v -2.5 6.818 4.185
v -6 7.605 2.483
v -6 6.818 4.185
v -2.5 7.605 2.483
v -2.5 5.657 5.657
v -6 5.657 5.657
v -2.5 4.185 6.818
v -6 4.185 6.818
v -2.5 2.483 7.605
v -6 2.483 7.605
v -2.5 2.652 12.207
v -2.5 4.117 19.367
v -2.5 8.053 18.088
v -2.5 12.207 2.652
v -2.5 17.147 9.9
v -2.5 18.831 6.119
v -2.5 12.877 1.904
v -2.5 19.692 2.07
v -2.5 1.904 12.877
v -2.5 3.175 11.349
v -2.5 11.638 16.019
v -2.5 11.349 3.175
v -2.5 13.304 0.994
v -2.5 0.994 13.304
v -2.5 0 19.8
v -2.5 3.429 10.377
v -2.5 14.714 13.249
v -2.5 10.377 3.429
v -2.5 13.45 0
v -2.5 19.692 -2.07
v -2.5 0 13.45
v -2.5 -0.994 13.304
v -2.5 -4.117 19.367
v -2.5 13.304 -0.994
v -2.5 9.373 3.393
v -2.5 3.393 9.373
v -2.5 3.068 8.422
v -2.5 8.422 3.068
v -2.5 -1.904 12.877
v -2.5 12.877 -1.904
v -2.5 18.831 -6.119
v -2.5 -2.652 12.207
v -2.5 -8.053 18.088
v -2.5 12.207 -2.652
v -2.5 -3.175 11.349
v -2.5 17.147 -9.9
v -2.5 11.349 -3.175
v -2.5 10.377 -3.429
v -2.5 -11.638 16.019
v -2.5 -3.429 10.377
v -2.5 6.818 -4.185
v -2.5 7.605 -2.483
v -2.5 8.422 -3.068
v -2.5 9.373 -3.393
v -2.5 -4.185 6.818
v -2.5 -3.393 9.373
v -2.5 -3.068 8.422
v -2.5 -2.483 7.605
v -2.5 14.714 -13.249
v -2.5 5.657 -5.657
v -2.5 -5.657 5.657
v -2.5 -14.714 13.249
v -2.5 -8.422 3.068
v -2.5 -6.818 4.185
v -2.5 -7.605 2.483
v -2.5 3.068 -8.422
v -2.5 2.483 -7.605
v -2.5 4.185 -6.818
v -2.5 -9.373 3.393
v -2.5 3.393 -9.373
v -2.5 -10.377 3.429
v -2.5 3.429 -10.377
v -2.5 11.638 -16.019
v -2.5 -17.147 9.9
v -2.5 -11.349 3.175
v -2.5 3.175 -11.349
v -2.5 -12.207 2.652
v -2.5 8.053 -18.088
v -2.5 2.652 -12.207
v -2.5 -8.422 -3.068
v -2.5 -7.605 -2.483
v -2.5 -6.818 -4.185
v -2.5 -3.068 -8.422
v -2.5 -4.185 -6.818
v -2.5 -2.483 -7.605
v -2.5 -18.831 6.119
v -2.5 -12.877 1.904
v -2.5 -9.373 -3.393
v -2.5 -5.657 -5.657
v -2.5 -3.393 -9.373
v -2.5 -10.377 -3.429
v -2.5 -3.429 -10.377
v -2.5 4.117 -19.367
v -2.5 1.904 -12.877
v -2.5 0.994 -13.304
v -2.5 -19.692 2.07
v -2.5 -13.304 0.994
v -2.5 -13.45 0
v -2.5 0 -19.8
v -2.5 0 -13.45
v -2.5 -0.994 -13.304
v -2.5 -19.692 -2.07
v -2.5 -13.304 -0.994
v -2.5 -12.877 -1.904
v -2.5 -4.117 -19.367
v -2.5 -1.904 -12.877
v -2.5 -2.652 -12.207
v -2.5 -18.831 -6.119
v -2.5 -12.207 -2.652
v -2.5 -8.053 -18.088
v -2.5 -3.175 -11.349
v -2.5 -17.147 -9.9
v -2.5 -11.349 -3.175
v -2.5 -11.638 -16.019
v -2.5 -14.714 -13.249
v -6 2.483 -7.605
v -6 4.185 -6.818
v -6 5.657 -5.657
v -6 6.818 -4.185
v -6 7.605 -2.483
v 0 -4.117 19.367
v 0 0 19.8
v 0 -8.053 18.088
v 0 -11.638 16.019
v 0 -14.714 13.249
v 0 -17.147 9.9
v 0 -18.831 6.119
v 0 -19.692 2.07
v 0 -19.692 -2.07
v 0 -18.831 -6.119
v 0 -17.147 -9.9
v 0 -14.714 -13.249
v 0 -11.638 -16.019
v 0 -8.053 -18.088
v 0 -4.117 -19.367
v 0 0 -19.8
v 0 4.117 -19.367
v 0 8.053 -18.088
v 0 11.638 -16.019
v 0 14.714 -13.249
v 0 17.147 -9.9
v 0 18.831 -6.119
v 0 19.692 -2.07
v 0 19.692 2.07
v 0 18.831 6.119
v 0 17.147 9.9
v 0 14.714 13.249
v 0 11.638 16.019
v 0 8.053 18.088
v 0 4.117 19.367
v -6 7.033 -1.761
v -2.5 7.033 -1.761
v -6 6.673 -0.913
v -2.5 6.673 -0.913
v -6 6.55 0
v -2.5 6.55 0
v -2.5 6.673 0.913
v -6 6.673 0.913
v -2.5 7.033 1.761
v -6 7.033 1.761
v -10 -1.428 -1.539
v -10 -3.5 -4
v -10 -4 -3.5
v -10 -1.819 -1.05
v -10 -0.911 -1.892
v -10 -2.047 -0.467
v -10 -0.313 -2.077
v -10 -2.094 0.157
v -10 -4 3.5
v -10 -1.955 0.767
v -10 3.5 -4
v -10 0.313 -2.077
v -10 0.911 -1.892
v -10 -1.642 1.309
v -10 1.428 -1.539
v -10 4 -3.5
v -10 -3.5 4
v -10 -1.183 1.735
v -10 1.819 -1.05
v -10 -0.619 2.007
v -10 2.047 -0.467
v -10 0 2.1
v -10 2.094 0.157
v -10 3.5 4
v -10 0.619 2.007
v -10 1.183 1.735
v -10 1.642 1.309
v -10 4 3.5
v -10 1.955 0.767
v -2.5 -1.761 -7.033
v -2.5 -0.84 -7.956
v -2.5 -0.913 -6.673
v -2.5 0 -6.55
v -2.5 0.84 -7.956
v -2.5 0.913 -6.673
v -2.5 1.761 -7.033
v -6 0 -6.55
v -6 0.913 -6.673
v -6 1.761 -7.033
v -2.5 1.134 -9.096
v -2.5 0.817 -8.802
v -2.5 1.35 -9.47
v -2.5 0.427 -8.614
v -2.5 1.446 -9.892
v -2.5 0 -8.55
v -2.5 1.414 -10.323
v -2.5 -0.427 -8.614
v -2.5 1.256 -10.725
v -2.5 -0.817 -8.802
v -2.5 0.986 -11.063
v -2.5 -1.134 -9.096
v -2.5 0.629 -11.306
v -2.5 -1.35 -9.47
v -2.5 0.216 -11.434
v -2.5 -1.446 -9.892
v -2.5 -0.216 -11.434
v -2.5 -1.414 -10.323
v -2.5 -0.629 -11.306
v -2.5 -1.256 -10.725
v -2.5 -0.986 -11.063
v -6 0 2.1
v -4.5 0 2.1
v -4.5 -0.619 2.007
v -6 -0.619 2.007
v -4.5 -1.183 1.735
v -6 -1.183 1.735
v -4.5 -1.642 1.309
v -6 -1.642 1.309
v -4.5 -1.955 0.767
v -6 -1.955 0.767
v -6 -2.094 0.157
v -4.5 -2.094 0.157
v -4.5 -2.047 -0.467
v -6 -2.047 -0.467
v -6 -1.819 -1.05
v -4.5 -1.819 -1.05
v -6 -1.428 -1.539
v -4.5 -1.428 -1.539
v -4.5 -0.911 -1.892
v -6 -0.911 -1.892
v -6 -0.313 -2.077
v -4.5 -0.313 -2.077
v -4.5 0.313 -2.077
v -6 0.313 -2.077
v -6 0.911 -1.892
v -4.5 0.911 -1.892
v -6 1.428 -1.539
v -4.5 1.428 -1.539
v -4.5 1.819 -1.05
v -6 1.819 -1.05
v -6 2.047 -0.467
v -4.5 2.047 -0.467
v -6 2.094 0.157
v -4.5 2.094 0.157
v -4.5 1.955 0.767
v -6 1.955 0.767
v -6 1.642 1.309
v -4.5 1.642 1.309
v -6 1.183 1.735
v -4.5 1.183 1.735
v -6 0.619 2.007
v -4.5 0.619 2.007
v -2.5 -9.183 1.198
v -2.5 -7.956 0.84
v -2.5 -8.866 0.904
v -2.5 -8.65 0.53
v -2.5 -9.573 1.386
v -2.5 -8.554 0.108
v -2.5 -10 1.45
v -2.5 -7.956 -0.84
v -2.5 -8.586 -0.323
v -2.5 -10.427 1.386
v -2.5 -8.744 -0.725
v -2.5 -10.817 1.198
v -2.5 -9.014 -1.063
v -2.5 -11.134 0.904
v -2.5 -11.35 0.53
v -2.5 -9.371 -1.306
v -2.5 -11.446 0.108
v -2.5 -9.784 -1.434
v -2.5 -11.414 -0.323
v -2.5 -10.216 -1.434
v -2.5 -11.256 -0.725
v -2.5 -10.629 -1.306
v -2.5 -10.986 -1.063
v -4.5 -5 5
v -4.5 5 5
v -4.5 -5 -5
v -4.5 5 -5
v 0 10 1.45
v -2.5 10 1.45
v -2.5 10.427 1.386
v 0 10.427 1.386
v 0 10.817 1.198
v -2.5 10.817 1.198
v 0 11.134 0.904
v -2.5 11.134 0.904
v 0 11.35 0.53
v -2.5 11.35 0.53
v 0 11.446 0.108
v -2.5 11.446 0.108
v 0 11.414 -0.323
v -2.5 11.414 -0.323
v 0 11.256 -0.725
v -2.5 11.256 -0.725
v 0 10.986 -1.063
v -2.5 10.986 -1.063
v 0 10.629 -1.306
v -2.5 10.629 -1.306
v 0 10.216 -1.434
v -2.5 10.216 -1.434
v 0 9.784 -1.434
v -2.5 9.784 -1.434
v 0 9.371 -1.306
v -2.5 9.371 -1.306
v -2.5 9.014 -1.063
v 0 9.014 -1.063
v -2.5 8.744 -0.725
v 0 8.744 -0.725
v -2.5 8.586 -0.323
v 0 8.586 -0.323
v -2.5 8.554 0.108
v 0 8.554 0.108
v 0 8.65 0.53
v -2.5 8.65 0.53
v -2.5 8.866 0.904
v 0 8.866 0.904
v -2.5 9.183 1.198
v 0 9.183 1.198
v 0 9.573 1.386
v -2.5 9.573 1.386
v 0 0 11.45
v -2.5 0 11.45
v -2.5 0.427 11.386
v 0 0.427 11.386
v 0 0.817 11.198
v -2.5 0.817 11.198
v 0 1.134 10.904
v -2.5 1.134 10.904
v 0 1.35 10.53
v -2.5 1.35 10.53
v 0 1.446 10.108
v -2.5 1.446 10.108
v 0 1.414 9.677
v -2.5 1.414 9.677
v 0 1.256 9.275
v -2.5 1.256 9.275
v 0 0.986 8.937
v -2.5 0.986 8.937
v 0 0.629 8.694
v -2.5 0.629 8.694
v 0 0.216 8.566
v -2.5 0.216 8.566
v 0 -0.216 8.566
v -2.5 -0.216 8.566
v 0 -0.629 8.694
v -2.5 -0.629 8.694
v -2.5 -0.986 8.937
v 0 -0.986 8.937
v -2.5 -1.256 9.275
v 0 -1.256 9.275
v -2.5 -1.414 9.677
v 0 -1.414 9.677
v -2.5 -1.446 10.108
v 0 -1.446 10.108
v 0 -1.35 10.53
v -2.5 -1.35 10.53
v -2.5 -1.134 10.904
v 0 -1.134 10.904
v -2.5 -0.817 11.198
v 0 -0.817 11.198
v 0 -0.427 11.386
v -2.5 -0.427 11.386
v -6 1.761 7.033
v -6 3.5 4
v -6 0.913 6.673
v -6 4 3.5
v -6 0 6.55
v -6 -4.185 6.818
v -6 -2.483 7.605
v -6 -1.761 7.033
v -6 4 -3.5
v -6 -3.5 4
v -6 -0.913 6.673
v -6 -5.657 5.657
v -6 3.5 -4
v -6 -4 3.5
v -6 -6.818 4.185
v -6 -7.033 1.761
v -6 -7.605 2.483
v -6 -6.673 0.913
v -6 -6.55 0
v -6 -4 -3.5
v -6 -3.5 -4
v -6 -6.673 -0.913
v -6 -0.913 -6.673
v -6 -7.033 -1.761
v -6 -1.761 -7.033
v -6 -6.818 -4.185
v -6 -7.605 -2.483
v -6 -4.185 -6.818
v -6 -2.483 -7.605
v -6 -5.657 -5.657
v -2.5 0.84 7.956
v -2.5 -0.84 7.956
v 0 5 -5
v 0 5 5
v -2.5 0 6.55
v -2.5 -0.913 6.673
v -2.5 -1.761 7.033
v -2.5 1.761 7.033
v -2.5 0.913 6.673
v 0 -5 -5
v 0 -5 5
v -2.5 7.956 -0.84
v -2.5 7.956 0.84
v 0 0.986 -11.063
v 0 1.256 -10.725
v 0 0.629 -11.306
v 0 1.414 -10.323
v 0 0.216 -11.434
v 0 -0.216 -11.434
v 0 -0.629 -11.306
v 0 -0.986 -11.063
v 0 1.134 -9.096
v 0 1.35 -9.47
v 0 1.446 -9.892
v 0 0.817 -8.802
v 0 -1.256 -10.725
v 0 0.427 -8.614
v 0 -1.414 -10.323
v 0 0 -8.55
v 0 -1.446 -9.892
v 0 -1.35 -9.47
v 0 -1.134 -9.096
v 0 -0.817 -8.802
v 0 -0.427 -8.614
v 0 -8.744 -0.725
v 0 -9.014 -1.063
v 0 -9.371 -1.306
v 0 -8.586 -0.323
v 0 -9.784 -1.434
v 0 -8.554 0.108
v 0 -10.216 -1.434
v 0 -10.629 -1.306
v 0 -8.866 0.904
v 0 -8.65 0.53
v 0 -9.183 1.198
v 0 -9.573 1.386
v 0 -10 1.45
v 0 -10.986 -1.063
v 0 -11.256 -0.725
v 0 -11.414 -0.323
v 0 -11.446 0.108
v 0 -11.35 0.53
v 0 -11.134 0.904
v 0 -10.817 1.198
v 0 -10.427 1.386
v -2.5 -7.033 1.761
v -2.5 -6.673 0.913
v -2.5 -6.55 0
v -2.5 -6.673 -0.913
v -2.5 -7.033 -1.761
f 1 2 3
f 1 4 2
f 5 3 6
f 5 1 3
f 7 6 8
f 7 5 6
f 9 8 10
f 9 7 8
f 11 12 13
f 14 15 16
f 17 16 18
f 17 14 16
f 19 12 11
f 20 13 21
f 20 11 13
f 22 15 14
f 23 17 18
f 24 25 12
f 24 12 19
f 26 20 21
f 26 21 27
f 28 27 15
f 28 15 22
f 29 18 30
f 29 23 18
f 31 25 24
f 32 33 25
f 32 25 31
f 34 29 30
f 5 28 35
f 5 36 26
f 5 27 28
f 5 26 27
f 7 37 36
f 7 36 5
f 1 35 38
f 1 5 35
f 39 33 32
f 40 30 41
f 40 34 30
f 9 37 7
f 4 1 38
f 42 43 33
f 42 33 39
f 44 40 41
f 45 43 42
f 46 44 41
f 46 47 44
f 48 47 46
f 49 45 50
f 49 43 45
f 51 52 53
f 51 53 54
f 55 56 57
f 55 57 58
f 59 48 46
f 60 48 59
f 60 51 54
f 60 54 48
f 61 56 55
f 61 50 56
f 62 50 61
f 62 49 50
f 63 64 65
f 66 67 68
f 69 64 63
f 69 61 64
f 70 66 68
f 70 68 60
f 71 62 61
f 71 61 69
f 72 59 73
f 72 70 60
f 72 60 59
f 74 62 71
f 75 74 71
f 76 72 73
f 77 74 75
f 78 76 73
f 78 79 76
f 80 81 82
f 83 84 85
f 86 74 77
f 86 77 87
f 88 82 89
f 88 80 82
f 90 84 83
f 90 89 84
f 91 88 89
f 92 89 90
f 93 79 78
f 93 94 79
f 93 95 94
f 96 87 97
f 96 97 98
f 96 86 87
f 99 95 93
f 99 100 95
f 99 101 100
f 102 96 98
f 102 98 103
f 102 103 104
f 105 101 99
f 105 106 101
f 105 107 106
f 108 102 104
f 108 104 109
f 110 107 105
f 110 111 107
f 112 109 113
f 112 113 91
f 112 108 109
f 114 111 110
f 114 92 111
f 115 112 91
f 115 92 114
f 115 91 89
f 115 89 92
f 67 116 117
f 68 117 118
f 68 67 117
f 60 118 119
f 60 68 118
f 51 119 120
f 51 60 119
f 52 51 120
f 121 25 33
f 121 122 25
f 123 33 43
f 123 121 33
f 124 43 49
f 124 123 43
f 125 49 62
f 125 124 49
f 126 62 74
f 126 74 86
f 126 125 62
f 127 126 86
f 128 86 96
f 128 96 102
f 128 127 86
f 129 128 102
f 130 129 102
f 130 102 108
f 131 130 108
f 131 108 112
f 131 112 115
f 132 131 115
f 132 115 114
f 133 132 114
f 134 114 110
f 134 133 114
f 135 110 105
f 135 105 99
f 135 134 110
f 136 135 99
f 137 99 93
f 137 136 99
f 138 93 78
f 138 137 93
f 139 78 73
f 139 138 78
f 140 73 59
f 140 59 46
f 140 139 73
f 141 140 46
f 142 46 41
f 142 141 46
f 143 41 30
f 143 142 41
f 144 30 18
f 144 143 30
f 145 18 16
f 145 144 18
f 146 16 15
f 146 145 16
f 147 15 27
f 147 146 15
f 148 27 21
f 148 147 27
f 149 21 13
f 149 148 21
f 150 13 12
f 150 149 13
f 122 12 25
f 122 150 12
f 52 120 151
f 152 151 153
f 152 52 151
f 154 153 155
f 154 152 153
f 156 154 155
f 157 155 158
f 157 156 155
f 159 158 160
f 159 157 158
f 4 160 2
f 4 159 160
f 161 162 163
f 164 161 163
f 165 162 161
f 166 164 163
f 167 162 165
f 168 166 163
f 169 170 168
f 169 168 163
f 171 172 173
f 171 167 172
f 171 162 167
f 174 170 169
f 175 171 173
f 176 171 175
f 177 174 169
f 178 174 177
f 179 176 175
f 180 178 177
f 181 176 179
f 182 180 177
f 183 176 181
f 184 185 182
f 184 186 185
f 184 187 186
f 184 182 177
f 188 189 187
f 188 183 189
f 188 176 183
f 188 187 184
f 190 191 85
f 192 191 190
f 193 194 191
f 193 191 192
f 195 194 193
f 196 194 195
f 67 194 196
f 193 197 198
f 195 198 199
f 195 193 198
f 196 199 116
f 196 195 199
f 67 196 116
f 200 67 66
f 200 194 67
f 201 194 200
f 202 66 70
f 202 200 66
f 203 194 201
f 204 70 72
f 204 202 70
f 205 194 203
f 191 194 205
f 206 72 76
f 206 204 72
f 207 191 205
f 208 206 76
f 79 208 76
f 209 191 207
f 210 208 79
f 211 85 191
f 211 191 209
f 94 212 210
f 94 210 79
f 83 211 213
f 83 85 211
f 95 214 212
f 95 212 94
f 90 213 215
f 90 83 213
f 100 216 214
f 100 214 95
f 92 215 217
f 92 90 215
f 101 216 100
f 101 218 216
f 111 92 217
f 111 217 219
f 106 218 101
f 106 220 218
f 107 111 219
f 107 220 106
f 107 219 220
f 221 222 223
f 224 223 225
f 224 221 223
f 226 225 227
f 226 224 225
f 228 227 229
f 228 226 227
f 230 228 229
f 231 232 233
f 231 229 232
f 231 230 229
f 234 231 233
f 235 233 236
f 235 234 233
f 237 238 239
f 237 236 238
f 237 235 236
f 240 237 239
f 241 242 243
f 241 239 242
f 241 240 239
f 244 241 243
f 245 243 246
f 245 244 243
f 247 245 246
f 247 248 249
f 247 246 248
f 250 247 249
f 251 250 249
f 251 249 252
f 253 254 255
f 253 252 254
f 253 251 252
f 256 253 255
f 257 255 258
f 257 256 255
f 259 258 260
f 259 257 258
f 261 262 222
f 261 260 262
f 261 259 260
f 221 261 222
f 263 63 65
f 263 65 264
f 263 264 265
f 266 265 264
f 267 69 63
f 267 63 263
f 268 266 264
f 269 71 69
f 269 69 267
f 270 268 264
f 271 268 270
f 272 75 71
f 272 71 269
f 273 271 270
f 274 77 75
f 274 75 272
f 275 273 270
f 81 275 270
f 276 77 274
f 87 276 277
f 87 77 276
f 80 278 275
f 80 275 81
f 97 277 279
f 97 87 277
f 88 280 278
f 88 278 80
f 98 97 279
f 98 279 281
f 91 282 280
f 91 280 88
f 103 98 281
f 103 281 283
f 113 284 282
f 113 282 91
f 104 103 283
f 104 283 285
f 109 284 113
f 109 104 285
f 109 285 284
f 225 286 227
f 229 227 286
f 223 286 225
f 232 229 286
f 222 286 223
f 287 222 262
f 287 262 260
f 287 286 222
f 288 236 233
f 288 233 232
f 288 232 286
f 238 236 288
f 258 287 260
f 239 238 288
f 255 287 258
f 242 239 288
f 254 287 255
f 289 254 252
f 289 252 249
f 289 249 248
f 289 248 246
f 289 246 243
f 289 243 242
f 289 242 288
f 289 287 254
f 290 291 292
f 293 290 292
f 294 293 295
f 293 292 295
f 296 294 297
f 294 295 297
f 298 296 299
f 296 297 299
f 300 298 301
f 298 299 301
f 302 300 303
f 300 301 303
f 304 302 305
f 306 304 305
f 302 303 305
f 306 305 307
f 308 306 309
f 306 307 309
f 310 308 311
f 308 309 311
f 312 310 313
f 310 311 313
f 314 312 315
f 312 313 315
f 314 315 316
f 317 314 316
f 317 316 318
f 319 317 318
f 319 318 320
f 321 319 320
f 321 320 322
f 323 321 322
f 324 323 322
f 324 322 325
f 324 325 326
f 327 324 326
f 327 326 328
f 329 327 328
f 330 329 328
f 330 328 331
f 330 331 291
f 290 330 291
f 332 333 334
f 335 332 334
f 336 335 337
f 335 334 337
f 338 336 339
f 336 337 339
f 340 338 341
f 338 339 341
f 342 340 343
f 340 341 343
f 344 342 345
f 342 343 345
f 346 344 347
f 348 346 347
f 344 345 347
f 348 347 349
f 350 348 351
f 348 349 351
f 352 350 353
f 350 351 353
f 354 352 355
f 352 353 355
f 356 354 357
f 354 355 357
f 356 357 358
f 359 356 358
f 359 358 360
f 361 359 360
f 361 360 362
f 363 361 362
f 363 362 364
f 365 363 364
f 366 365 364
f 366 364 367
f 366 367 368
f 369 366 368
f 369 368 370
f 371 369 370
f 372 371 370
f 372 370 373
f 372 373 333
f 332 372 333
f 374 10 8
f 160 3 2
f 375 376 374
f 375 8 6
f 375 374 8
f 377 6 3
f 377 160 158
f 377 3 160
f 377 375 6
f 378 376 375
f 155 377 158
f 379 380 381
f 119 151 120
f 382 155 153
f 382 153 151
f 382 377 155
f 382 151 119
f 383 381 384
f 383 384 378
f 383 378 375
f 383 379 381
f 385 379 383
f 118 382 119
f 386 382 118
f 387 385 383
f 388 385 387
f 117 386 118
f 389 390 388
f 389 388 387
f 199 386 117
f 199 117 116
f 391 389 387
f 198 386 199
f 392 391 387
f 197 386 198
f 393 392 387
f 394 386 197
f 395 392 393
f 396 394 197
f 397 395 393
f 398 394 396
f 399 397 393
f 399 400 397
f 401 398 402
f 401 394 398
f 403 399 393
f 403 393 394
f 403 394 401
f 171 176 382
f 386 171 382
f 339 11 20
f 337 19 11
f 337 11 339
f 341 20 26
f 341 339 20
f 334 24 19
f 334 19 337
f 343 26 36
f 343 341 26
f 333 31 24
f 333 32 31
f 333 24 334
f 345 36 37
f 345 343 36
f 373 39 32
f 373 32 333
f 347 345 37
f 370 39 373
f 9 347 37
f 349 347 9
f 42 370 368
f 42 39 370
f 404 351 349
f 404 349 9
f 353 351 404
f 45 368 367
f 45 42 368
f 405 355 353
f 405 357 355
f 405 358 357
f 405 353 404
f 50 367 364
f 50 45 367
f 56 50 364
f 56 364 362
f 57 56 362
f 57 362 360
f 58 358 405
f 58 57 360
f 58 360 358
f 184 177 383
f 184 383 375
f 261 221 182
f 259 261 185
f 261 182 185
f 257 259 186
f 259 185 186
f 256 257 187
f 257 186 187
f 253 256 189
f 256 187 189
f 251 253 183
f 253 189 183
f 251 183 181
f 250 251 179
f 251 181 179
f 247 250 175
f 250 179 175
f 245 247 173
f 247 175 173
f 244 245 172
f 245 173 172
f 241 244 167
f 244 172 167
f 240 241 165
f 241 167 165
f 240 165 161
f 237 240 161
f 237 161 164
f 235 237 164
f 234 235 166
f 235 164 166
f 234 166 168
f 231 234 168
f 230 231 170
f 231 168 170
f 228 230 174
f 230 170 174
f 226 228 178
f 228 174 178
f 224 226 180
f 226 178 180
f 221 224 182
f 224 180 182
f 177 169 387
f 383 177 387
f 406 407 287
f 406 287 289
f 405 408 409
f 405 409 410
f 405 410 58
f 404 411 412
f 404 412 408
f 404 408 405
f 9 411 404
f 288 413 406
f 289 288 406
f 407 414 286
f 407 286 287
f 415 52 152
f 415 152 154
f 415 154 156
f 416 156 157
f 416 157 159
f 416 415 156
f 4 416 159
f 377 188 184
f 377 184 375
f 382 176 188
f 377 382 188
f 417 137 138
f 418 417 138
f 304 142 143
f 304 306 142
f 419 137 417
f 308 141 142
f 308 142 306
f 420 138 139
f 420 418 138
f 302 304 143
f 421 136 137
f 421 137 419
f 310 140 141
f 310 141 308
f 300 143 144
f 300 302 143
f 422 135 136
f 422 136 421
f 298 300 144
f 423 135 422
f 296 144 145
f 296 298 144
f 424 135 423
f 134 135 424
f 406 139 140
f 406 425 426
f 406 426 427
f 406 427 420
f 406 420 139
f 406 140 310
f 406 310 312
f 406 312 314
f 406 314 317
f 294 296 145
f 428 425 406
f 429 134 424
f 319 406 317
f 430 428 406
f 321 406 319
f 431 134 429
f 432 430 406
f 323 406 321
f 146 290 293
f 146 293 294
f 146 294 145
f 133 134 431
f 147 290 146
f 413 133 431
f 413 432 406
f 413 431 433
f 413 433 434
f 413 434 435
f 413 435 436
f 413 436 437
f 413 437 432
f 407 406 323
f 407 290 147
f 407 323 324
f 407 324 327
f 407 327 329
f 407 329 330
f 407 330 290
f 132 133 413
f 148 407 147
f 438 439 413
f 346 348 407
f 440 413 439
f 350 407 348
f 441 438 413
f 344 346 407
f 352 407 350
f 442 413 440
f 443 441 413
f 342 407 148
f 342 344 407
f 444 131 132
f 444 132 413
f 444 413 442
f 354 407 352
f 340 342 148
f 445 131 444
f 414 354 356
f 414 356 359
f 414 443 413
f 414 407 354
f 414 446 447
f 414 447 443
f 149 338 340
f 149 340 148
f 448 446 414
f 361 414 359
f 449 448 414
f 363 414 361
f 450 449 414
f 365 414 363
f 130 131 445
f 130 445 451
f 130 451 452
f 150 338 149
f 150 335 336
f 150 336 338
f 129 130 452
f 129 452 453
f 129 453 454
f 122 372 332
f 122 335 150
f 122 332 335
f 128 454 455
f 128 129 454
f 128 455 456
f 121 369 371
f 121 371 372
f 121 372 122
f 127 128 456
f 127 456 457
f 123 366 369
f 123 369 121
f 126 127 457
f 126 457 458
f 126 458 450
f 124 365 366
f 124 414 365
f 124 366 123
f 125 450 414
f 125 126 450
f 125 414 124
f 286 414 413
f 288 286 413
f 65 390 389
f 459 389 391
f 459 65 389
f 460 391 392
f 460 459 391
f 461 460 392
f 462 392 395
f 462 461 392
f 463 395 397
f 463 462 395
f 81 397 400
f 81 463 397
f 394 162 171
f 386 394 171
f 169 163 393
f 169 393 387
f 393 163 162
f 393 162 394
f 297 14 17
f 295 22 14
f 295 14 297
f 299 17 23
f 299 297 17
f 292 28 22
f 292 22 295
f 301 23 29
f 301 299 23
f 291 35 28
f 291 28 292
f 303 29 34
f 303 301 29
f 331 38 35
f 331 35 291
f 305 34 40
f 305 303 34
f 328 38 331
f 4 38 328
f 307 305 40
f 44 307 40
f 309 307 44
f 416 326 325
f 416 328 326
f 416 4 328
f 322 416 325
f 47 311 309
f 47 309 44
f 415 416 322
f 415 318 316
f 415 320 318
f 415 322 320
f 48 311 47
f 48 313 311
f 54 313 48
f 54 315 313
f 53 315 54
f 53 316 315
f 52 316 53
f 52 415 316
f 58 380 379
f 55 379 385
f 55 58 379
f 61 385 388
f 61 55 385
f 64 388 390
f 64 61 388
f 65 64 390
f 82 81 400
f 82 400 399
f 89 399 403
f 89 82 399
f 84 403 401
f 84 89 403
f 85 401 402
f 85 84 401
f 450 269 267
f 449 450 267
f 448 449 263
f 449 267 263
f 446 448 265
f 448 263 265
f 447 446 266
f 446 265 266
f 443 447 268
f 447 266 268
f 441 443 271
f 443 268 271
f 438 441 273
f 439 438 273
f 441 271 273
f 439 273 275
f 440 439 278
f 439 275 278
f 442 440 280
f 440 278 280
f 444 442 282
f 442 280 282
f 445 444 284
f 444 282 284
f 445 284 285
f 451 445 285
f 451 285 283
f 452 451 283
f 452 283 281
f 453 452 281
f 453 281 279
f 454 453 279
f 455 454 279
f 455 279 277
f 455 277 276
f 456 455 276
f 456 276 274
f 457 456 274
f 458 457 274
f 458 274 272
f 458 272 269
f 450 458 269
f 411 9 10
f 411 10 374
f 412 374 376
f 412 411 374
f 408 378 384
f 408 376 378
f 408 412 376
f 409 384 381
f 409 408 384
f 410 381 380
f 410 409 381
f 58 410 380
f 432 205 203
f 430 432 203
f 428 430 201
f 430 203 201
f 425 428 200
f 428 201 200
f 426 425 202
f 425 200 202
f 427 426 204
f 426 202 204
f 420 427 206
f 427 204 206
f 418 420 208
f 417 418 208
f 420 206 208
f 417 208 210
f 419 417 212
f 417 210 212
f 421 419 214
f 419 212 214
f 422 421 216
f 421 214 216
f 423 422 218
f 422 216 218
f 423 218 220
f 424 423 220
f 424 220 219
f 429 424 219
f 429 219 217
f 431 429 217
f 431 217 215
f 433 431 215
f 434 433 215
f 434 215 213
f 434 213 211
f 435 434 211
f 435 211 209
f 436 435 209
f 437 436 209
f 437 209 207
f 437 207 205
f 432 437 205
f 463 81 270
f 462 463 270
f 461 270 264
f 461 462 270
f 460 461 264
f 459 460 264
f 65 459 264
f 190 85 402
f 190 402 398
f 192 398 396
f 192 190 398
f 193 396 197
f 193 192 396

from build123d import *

# Parameters (mm, degrees)
ESQUISSE2_R             = 1.45
ENL_V_MAT_EXTRU_1_DEPTH = 29.219319623
ESQUISSE3_W             = 10
ESQUISSE3_H             = 10
ENL_V_MAT_EXTRU_2_DEPTH = 4.5
BOSS_EXTRU_1_START      = 4
ESQUISSE4_W             = 8
ESQUISSE4_H             = 8
ESQUISSE4_R             = 2.1
BOSS_EXTRU_1_DEPTH      = 4
ESQUISSE5_R             = 3.45
ENL_V_MAT_EXTRU_3_DEPTH = 29.988445974
CHANFREIN1_SIZE         = 0.5


with BuildPart() as part:
    # Esquisse1 → Révolution1 (revolve)
    with BuildSketch(Plane.XY, mode=Mode.PRIVATE) as r_volution1_sk:
        Polygon((0, 19.8), (0, 2.1), (-6, 2.1), (-6, 8), (-2.5, 8), (-2.5, 19.8), align=None)
    revolve(r_volution1_sk.sketch.rotate(Axis((0, 0, 0), (1, 0, 0)), 90), axis=Axis((0, 0, 0), (1, 0, 0)))

    # Esquisse2 → Enlèv. mat.-Extru.1 (cut, through all)
    with BuildSketch(Plane.ZY.offset(2.5)):
        with Locations((0, 10)):
            Circle(ESQUISSE2_R)
        with Locations((-10, 0)):
            Circle(ESQUISSE2_R)
        with Locations((10, 0)):
            Circle(ESQUISSE2_R)
        with Locations((0, -10)):
            Circle(ESQUISSE2_R)
    extrude(amount=-ENL_V_MAT_EXTRU_1_DEPTH, mode=Mode.SUBTRACT)

    # Esquisse3 → Enlèv. mat.-Extru.2 (cut)
    with BuildSketch(Plane(origin=(0, 0, 0), x_dir=(0, 0, -1), z_dir=(1, 0, 0))):
        Rectangle(ESQUISSE3_W, ESQUISSE3_H)
    extrude(amount=-ENL_V_MAT_EXTRU_2_DEPTH, mode=Mode.SUBTRACT)

    # Esquisse4 → Boss.-Extru.1 (add)
    with BuildSketch(Plane.ZY.offset(6).offset(BOSS_EXTRU_1_START)):
        Rectangle(ESQUISSE4_W, ESQUISSE4_H)
        Circle(ESQUISSE4_R, mode=Mode.SUBTRACT)
    extrude(amount=-BOSS_EXTRU_1_DEPTH)

    # Esquisse5 → Enlèv. mat.-Extru.3 (cut, through all)
    with BuildSketch(Plane.ZY.offset(2.5)):
        with Locations((0, 10)):
            Circle(ESQUISSE5_R)
        with Locations((10, 0)):
            Circle(ESQUISSE5_R)
        with Locations((0, -10)):
            Circle(ESQUISSE5_R)
        with Locations((-10, 0)):
            Circle(ESQUISSE5_R)
    extrude(amount=ENL_V_MAT_EXTRU_3_DEPTH, mode=Mode.SUBTRACT)

    # Chanfrein1
    chanfrein1_edges = [part.edges().sort_by_distance(p)[0] for p in [
        (-8, -4, 4),
        (-8, 4, 4),
        (-8, 4, -4),
        (-8, -4, -4),
    ]]
    chamfer(chanfrein1_edges, length=CHANFREIN1_SIZE)


solid = part.part
